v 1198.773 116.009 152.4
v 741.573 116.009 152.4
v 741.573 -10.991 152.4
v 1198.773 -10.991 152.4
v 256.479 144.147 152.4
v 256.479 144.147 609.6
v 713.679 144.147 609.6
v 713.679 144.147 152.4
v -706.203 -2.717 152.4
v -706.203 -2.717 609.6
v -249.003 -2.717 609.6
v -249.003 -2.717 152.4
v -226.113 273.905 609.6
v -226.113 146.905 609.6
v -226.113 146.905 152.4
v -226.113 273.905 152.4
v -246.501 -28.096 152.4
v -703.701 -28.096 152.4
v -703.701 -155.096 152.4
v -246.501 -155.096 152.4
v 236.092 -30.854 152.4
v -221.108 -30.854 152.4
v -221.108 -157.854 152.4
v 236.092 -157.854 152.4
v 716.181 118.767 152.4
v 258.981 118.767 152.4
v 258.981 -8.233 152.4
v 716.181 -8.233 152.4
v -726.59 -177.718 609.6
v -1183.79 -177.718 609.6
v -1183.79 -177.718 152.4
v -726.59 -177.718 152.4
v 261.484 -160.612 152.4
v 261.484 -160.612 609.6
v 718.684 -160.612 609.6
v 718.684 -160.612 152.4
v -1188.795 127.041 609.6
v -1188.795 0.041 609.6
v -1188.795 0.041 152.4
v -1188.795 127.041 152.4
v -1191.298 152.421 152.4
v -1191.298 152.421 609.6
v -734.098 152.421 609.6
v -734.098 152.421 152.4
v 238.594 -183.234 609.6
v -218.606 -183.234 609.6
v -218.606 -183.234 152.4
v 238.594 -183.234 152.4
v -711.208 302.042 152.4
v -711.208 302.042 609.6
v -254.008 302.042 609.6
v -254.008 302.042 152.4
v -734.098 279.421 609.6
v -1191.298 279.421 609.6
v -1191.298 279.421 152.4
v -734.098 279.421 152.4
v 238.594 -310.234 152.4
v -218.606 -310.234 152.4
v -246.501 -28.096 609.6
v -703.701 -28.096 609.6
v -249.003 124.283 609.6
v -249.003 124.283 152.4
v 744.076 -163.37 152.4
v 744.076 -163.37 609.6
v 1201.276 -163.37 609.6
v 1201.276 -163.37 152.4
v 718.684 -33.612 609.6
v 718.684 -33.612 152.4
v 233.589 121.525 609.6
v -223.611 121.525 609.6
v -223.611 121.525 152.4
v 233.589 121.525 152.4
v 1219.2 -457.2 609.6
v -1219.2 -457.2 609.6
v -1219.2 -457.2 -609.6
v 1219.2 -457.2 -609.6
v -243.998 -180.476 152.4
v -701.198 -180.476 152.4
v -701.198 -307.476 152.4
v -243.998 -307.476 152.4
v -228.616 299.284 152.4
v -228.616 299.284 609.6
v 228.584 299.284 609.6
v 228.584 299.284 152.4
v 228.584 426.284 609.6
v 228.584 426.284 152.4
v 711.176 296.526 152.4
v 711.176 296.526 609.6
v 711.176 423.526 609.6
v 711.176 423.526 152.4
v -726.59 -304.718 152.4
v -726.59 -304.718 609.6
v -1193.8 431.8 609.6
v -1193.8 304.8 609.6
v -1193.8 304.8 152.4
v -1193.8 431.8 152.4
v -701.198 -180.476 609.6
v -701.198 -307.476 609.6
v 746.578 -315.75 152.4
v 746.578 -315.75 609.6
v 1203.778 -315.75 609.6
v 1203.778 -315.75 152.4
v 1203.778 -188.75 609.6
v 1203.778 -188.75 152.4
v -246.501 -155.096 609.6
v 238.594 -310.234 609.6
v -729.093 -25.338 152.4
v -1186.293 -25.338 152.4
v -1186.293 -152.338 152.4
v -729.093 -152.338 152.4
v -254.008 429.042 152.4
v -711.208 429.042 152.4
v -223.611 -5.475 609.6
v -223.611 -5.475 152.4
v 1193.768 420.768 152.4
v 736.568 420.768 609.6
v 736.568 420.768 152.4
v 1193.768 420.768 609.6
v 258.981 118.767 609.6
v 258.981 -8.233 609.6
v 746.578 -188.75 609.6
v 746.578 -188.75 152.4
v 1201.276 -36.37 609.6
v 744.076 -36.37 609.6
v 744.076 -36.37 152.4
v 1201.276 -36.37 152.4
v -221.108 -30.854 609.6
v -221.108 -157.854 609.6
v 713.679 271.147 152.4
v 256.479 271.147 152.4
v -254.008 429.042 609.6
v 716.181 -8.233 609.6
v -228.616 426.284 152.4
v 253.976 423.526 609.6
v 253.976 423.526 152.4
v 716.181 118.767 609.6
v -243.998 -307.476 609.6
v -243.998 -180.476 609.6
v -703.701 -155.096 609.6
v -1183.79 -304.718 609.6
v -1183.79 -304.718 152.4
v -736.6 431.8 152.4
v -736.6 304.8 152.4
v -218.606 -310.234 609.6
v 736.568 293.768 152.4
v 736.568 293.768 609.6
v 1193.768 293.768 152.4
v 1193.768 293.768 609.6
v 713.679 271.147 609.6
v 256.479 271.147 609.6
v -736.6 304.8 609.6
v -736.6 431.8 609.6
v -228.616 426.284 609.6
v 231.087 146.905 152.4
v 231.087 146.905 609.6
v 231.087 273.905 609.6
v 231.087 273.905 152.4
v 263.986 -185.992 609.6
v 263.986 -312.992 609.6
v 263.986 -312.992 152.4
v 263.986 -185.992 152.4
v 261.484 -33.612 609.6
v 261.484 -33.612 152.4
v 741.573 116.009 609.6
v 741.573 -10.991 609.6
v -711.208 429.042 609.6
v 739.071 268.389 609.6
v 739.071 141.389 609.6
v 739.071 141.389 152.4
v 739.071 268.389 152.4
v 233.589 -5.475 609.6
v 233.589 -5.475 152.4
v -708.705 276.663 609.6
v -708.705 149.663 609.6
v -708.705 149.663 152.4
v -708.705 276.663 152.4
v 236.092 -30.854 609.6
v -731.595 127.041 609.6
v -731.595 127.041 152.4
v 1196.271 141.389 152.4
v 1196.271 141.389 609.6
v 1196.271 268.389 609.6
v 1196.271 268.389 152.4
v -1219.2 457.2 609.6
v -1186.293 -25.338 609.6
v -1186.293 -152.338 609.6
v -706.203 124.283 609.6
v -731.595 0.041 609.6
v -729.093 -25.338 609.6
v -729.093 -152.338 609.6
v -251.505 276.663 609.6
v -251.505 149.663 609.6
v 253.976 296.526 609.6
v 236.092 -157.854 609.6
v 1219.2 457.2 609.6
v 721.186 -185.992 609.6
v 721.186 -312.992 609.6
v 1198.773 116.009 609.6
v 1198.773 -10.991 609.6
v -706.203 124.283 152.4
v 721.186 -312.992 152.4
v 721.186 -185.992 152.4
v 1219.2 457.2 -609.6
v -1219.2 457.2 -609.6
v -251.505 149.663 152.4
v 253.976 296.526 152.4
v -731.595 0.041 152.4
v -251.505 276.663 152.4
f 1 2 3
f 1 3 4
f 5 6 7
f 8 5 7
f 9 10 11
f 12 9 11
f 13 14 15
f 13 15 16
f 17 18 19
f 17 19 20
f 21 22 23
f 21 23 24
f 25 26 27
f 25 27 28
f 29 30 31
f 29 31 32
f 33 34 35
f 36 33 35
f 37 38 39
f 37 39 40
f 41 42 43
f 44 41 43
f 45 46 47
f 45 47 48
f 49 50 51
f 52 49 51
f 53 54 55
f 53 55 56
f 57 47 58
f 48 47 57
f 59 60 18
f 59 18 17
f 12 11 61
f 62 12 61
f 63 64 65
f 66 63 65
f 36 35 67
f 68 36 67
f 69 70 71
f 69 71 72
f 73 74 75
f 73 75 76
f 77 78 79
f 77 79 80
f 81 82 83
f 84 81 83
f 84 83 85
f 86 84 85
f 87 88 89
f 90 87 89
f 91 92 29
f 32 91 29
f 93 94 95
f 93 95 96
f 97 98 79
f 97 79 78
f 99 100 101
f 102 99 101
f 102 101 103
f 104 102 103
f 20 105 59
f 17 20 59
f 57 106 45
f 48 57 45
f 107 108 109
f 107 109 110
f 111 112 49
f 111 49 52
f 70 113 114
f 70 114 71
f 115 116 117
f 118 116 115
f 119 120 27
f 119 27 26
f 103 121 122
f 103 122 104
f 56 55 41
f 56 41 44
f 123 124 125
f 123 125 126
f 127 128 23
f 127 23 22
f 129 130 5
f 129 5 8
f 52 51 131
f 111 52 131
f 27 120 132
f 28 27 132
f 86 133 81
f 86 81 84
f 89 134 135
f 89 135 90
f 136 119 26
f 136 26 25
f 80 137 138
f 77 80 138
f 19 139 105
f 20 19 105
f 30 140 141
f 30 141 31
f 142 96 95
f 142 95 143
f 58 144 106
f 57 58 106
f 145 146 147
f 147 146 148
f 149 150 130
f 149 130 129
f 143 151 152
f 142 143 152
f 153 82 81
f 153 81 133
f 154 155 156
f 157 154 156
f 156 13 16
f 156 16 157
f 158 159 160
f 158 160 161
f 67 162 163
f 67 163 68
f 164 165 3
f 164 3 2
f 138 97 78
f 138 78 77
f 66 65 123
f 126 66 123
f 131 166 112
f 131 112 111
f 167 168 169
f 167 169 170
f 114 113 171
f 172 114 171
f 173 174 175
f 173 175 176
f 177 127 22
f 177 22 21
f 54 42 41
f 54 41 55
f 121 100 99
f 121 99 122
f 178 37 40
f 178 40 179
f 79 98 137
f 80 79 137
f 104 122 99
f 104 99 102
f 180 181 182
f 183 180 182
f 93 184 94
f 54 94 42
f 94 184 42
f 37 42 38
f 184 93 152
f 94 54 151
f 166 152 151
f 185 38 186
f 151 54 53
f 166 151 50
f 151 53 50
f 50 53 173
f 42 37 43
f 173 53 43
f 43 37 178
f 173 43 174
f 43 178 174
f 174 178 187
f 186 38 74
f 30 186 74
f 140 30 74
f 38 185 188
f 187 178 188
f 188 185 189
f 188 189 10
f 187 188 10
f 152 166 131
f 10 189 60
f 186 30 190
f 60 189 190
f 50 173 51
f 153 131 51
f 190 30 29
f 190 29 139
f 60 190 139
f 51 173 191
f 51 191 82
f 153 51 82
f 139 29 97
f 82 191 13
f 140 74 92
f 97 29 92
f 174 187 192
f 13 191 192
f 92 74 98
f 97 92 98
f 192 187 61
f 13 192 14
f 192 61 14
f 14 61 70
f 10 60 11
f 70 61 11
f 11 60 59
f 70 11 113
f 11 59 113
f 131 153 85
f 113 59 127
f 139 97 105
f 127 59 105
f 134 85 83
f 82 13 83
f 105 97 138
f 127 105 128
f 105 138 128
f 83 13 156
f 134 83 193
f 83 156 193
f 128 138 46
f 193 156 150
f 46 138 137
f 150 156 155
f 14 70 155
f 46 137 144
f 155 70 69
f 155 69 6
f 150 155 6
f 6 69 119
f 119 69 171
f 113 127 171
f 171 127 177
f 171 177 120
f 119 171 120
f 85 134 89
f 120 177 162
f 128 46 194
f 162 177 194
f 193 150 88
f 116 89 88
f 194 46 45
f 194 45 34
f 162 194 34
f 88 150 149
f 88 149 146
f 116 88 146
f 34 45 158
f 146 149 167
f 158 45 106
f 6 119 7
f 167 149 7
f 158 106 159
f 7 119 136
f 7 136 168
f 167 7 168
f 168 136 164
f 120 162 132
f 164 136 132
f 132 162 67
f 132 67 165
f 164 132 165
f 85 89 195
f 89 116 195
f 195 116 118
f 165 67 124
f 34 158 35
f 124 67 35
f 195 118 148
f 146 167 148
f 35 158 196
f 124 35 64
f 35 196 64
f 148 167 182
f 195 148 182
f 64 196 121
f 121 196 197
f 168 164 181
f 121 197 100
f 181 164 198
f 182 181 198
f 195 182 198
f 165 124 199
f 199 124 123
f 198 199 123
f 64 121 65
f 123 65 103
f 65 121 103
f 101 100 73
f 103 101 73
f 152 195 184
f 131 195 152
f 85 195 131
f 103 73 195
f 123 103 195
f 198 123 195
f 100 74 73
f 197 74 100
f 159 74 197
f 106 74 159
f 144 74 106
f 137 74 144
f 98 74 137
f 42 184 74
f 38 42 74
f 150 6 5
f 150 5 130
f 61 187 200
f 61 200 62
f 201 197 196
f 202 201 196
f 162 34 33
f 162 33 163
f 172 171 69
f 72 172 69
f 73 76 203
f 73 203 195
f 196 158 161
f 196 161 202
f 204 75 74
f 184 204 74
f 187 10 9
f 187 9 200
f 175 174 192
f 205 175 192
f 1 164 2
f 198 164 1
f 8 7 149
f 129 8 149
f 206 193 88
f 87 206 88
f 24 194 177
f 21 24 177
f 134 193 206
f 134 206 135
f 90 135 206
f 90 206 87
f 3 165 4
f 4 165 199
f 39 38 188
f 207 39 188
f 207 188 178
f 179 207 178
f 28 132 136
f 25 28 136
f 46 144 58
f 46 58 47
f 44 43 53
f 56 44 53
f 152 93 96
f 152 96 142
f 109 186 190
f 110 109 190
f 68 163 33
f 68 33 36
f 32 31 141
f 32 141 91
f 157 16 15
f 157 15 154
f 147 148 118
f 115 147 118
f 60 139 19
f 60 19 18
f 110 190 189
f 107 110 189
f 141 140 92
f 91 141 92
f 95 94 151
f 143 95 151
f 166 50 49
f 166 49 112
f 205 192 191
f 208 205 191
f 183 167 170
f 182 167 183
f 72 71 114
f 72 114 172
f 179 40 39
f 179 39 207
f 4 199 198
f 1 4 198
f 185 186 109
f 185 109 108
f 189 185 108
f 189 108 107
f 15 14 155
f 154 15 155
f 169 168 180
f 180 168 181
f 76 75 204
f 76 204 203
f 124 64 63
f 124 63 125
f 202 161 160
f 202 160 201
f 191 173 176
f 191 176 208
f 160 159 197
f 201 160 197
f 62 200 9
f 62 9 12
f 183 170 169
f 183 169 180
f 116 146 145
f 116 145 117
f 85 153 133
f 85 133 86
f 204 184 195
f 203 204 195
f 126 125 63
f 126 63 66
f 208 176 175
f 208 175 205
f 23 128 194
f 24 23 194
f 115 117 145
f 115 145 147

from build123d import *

# Parameters (mm, degrees)
F0_W     = 2438.4
F0_H     = 1219.2
F1_DEPTH = 457.2
F2_W     = 457.2
F2_H     = 127
F3_DEPTH = 457.2


with BuildPart() as f1:
    # F0 (on Front) → F1 (new body, symmetric)
    with BuildSketch(Plane.XZ):
        Rectangle(F0_W, F0_H)
    extrude(amount=F1_DEPTH, both=True)

    # F2 (on face) → F3 (cut)
    with BuildSketch(Plane.XY.offset(609.6)):
        with Locations((-965.2, 368.3)):
            Rectangle(F2_W, F2_H)
        with Locations((-962.697564, 215.920547)):
            Rectangle(F2_W, F2_H)
        with Locations((-960.195127, 63.541093)):
            Rectangle(F2_W, F2_H)
        with Locations((-957.692691, -88.83836)):
            Rectangle(F2_W, F2_H)
        with Locations((-955.190254, -241.217814)):
            Rectangle(F2_W, F2_H)
        with Locations((-482.607881, 365.542049)):
            Rectangle(F2_W, F2_H)
        with Locations((-480.105444, 213.162596)):
            Rectangle(F2_W, F2_H)
        with Locations((-477.603008, 60.783143)):
            Rectangle(F2_W, F2_H)
        with Locations((-475.100571, -91.596311)):
            Rectangle(F2_W, F2_H)
        with Locations((-472.598135, -243.975764)):
            Rectangle(F2_W, F2_H)
        with Locations((-0.015761, 362.784099)):
            Rectangle(F2_W, F2_H)
        with Locations((2.486675, 210.404645)):
            Rectangle(F2_W, F2_H)
        with Locations((4.989112, 58.025192)):
            Rectangle(F2_W, F2_H)
        with Locations((7.491548, -94.354261)):
            Rectangle(F2_W, F2_H)
        with Locations((9.993984, -246.733715)):
            Rectangle(F2_W, F2_H)
        with Locations((482.576358, 360.026148)):
            Rectangle(F2_W, F2_H)
        with Locations((485.078795, 207.646695)):
            Rectangle(F2_W, F2_H)
        with Locations((487.581231, 55.267242)):
            Rectangle(F2_W, F2_H)
        with Locations((490.083667, -97.112212)):
            Rectangle(F2_W, F2_H)
        with Locations((492.586104, -249.491665)):
            Rectangle(F2_W, F2_H)
        with Locations((965.168478, 357.268198)):
            Rectangle(F2_W, F2_H)
        with Locations((967.670914, 204.888744)):
            Rectangle(F2_W, F2_H)
        with Locations((970.17335, 52.509291)):
            Rectangle(F2_W, F2_H)
        with Locations((972.675787, -99.870162)):
            Rectangle(F2_W, F2_H)
        with Locations((975.178223, -252.249616)):
            Rectangle(F2_W, F2_H)
    extrude(amount=-F3_DEPTH, mode=Mode.SUBTRACT)


solid = f1.part
